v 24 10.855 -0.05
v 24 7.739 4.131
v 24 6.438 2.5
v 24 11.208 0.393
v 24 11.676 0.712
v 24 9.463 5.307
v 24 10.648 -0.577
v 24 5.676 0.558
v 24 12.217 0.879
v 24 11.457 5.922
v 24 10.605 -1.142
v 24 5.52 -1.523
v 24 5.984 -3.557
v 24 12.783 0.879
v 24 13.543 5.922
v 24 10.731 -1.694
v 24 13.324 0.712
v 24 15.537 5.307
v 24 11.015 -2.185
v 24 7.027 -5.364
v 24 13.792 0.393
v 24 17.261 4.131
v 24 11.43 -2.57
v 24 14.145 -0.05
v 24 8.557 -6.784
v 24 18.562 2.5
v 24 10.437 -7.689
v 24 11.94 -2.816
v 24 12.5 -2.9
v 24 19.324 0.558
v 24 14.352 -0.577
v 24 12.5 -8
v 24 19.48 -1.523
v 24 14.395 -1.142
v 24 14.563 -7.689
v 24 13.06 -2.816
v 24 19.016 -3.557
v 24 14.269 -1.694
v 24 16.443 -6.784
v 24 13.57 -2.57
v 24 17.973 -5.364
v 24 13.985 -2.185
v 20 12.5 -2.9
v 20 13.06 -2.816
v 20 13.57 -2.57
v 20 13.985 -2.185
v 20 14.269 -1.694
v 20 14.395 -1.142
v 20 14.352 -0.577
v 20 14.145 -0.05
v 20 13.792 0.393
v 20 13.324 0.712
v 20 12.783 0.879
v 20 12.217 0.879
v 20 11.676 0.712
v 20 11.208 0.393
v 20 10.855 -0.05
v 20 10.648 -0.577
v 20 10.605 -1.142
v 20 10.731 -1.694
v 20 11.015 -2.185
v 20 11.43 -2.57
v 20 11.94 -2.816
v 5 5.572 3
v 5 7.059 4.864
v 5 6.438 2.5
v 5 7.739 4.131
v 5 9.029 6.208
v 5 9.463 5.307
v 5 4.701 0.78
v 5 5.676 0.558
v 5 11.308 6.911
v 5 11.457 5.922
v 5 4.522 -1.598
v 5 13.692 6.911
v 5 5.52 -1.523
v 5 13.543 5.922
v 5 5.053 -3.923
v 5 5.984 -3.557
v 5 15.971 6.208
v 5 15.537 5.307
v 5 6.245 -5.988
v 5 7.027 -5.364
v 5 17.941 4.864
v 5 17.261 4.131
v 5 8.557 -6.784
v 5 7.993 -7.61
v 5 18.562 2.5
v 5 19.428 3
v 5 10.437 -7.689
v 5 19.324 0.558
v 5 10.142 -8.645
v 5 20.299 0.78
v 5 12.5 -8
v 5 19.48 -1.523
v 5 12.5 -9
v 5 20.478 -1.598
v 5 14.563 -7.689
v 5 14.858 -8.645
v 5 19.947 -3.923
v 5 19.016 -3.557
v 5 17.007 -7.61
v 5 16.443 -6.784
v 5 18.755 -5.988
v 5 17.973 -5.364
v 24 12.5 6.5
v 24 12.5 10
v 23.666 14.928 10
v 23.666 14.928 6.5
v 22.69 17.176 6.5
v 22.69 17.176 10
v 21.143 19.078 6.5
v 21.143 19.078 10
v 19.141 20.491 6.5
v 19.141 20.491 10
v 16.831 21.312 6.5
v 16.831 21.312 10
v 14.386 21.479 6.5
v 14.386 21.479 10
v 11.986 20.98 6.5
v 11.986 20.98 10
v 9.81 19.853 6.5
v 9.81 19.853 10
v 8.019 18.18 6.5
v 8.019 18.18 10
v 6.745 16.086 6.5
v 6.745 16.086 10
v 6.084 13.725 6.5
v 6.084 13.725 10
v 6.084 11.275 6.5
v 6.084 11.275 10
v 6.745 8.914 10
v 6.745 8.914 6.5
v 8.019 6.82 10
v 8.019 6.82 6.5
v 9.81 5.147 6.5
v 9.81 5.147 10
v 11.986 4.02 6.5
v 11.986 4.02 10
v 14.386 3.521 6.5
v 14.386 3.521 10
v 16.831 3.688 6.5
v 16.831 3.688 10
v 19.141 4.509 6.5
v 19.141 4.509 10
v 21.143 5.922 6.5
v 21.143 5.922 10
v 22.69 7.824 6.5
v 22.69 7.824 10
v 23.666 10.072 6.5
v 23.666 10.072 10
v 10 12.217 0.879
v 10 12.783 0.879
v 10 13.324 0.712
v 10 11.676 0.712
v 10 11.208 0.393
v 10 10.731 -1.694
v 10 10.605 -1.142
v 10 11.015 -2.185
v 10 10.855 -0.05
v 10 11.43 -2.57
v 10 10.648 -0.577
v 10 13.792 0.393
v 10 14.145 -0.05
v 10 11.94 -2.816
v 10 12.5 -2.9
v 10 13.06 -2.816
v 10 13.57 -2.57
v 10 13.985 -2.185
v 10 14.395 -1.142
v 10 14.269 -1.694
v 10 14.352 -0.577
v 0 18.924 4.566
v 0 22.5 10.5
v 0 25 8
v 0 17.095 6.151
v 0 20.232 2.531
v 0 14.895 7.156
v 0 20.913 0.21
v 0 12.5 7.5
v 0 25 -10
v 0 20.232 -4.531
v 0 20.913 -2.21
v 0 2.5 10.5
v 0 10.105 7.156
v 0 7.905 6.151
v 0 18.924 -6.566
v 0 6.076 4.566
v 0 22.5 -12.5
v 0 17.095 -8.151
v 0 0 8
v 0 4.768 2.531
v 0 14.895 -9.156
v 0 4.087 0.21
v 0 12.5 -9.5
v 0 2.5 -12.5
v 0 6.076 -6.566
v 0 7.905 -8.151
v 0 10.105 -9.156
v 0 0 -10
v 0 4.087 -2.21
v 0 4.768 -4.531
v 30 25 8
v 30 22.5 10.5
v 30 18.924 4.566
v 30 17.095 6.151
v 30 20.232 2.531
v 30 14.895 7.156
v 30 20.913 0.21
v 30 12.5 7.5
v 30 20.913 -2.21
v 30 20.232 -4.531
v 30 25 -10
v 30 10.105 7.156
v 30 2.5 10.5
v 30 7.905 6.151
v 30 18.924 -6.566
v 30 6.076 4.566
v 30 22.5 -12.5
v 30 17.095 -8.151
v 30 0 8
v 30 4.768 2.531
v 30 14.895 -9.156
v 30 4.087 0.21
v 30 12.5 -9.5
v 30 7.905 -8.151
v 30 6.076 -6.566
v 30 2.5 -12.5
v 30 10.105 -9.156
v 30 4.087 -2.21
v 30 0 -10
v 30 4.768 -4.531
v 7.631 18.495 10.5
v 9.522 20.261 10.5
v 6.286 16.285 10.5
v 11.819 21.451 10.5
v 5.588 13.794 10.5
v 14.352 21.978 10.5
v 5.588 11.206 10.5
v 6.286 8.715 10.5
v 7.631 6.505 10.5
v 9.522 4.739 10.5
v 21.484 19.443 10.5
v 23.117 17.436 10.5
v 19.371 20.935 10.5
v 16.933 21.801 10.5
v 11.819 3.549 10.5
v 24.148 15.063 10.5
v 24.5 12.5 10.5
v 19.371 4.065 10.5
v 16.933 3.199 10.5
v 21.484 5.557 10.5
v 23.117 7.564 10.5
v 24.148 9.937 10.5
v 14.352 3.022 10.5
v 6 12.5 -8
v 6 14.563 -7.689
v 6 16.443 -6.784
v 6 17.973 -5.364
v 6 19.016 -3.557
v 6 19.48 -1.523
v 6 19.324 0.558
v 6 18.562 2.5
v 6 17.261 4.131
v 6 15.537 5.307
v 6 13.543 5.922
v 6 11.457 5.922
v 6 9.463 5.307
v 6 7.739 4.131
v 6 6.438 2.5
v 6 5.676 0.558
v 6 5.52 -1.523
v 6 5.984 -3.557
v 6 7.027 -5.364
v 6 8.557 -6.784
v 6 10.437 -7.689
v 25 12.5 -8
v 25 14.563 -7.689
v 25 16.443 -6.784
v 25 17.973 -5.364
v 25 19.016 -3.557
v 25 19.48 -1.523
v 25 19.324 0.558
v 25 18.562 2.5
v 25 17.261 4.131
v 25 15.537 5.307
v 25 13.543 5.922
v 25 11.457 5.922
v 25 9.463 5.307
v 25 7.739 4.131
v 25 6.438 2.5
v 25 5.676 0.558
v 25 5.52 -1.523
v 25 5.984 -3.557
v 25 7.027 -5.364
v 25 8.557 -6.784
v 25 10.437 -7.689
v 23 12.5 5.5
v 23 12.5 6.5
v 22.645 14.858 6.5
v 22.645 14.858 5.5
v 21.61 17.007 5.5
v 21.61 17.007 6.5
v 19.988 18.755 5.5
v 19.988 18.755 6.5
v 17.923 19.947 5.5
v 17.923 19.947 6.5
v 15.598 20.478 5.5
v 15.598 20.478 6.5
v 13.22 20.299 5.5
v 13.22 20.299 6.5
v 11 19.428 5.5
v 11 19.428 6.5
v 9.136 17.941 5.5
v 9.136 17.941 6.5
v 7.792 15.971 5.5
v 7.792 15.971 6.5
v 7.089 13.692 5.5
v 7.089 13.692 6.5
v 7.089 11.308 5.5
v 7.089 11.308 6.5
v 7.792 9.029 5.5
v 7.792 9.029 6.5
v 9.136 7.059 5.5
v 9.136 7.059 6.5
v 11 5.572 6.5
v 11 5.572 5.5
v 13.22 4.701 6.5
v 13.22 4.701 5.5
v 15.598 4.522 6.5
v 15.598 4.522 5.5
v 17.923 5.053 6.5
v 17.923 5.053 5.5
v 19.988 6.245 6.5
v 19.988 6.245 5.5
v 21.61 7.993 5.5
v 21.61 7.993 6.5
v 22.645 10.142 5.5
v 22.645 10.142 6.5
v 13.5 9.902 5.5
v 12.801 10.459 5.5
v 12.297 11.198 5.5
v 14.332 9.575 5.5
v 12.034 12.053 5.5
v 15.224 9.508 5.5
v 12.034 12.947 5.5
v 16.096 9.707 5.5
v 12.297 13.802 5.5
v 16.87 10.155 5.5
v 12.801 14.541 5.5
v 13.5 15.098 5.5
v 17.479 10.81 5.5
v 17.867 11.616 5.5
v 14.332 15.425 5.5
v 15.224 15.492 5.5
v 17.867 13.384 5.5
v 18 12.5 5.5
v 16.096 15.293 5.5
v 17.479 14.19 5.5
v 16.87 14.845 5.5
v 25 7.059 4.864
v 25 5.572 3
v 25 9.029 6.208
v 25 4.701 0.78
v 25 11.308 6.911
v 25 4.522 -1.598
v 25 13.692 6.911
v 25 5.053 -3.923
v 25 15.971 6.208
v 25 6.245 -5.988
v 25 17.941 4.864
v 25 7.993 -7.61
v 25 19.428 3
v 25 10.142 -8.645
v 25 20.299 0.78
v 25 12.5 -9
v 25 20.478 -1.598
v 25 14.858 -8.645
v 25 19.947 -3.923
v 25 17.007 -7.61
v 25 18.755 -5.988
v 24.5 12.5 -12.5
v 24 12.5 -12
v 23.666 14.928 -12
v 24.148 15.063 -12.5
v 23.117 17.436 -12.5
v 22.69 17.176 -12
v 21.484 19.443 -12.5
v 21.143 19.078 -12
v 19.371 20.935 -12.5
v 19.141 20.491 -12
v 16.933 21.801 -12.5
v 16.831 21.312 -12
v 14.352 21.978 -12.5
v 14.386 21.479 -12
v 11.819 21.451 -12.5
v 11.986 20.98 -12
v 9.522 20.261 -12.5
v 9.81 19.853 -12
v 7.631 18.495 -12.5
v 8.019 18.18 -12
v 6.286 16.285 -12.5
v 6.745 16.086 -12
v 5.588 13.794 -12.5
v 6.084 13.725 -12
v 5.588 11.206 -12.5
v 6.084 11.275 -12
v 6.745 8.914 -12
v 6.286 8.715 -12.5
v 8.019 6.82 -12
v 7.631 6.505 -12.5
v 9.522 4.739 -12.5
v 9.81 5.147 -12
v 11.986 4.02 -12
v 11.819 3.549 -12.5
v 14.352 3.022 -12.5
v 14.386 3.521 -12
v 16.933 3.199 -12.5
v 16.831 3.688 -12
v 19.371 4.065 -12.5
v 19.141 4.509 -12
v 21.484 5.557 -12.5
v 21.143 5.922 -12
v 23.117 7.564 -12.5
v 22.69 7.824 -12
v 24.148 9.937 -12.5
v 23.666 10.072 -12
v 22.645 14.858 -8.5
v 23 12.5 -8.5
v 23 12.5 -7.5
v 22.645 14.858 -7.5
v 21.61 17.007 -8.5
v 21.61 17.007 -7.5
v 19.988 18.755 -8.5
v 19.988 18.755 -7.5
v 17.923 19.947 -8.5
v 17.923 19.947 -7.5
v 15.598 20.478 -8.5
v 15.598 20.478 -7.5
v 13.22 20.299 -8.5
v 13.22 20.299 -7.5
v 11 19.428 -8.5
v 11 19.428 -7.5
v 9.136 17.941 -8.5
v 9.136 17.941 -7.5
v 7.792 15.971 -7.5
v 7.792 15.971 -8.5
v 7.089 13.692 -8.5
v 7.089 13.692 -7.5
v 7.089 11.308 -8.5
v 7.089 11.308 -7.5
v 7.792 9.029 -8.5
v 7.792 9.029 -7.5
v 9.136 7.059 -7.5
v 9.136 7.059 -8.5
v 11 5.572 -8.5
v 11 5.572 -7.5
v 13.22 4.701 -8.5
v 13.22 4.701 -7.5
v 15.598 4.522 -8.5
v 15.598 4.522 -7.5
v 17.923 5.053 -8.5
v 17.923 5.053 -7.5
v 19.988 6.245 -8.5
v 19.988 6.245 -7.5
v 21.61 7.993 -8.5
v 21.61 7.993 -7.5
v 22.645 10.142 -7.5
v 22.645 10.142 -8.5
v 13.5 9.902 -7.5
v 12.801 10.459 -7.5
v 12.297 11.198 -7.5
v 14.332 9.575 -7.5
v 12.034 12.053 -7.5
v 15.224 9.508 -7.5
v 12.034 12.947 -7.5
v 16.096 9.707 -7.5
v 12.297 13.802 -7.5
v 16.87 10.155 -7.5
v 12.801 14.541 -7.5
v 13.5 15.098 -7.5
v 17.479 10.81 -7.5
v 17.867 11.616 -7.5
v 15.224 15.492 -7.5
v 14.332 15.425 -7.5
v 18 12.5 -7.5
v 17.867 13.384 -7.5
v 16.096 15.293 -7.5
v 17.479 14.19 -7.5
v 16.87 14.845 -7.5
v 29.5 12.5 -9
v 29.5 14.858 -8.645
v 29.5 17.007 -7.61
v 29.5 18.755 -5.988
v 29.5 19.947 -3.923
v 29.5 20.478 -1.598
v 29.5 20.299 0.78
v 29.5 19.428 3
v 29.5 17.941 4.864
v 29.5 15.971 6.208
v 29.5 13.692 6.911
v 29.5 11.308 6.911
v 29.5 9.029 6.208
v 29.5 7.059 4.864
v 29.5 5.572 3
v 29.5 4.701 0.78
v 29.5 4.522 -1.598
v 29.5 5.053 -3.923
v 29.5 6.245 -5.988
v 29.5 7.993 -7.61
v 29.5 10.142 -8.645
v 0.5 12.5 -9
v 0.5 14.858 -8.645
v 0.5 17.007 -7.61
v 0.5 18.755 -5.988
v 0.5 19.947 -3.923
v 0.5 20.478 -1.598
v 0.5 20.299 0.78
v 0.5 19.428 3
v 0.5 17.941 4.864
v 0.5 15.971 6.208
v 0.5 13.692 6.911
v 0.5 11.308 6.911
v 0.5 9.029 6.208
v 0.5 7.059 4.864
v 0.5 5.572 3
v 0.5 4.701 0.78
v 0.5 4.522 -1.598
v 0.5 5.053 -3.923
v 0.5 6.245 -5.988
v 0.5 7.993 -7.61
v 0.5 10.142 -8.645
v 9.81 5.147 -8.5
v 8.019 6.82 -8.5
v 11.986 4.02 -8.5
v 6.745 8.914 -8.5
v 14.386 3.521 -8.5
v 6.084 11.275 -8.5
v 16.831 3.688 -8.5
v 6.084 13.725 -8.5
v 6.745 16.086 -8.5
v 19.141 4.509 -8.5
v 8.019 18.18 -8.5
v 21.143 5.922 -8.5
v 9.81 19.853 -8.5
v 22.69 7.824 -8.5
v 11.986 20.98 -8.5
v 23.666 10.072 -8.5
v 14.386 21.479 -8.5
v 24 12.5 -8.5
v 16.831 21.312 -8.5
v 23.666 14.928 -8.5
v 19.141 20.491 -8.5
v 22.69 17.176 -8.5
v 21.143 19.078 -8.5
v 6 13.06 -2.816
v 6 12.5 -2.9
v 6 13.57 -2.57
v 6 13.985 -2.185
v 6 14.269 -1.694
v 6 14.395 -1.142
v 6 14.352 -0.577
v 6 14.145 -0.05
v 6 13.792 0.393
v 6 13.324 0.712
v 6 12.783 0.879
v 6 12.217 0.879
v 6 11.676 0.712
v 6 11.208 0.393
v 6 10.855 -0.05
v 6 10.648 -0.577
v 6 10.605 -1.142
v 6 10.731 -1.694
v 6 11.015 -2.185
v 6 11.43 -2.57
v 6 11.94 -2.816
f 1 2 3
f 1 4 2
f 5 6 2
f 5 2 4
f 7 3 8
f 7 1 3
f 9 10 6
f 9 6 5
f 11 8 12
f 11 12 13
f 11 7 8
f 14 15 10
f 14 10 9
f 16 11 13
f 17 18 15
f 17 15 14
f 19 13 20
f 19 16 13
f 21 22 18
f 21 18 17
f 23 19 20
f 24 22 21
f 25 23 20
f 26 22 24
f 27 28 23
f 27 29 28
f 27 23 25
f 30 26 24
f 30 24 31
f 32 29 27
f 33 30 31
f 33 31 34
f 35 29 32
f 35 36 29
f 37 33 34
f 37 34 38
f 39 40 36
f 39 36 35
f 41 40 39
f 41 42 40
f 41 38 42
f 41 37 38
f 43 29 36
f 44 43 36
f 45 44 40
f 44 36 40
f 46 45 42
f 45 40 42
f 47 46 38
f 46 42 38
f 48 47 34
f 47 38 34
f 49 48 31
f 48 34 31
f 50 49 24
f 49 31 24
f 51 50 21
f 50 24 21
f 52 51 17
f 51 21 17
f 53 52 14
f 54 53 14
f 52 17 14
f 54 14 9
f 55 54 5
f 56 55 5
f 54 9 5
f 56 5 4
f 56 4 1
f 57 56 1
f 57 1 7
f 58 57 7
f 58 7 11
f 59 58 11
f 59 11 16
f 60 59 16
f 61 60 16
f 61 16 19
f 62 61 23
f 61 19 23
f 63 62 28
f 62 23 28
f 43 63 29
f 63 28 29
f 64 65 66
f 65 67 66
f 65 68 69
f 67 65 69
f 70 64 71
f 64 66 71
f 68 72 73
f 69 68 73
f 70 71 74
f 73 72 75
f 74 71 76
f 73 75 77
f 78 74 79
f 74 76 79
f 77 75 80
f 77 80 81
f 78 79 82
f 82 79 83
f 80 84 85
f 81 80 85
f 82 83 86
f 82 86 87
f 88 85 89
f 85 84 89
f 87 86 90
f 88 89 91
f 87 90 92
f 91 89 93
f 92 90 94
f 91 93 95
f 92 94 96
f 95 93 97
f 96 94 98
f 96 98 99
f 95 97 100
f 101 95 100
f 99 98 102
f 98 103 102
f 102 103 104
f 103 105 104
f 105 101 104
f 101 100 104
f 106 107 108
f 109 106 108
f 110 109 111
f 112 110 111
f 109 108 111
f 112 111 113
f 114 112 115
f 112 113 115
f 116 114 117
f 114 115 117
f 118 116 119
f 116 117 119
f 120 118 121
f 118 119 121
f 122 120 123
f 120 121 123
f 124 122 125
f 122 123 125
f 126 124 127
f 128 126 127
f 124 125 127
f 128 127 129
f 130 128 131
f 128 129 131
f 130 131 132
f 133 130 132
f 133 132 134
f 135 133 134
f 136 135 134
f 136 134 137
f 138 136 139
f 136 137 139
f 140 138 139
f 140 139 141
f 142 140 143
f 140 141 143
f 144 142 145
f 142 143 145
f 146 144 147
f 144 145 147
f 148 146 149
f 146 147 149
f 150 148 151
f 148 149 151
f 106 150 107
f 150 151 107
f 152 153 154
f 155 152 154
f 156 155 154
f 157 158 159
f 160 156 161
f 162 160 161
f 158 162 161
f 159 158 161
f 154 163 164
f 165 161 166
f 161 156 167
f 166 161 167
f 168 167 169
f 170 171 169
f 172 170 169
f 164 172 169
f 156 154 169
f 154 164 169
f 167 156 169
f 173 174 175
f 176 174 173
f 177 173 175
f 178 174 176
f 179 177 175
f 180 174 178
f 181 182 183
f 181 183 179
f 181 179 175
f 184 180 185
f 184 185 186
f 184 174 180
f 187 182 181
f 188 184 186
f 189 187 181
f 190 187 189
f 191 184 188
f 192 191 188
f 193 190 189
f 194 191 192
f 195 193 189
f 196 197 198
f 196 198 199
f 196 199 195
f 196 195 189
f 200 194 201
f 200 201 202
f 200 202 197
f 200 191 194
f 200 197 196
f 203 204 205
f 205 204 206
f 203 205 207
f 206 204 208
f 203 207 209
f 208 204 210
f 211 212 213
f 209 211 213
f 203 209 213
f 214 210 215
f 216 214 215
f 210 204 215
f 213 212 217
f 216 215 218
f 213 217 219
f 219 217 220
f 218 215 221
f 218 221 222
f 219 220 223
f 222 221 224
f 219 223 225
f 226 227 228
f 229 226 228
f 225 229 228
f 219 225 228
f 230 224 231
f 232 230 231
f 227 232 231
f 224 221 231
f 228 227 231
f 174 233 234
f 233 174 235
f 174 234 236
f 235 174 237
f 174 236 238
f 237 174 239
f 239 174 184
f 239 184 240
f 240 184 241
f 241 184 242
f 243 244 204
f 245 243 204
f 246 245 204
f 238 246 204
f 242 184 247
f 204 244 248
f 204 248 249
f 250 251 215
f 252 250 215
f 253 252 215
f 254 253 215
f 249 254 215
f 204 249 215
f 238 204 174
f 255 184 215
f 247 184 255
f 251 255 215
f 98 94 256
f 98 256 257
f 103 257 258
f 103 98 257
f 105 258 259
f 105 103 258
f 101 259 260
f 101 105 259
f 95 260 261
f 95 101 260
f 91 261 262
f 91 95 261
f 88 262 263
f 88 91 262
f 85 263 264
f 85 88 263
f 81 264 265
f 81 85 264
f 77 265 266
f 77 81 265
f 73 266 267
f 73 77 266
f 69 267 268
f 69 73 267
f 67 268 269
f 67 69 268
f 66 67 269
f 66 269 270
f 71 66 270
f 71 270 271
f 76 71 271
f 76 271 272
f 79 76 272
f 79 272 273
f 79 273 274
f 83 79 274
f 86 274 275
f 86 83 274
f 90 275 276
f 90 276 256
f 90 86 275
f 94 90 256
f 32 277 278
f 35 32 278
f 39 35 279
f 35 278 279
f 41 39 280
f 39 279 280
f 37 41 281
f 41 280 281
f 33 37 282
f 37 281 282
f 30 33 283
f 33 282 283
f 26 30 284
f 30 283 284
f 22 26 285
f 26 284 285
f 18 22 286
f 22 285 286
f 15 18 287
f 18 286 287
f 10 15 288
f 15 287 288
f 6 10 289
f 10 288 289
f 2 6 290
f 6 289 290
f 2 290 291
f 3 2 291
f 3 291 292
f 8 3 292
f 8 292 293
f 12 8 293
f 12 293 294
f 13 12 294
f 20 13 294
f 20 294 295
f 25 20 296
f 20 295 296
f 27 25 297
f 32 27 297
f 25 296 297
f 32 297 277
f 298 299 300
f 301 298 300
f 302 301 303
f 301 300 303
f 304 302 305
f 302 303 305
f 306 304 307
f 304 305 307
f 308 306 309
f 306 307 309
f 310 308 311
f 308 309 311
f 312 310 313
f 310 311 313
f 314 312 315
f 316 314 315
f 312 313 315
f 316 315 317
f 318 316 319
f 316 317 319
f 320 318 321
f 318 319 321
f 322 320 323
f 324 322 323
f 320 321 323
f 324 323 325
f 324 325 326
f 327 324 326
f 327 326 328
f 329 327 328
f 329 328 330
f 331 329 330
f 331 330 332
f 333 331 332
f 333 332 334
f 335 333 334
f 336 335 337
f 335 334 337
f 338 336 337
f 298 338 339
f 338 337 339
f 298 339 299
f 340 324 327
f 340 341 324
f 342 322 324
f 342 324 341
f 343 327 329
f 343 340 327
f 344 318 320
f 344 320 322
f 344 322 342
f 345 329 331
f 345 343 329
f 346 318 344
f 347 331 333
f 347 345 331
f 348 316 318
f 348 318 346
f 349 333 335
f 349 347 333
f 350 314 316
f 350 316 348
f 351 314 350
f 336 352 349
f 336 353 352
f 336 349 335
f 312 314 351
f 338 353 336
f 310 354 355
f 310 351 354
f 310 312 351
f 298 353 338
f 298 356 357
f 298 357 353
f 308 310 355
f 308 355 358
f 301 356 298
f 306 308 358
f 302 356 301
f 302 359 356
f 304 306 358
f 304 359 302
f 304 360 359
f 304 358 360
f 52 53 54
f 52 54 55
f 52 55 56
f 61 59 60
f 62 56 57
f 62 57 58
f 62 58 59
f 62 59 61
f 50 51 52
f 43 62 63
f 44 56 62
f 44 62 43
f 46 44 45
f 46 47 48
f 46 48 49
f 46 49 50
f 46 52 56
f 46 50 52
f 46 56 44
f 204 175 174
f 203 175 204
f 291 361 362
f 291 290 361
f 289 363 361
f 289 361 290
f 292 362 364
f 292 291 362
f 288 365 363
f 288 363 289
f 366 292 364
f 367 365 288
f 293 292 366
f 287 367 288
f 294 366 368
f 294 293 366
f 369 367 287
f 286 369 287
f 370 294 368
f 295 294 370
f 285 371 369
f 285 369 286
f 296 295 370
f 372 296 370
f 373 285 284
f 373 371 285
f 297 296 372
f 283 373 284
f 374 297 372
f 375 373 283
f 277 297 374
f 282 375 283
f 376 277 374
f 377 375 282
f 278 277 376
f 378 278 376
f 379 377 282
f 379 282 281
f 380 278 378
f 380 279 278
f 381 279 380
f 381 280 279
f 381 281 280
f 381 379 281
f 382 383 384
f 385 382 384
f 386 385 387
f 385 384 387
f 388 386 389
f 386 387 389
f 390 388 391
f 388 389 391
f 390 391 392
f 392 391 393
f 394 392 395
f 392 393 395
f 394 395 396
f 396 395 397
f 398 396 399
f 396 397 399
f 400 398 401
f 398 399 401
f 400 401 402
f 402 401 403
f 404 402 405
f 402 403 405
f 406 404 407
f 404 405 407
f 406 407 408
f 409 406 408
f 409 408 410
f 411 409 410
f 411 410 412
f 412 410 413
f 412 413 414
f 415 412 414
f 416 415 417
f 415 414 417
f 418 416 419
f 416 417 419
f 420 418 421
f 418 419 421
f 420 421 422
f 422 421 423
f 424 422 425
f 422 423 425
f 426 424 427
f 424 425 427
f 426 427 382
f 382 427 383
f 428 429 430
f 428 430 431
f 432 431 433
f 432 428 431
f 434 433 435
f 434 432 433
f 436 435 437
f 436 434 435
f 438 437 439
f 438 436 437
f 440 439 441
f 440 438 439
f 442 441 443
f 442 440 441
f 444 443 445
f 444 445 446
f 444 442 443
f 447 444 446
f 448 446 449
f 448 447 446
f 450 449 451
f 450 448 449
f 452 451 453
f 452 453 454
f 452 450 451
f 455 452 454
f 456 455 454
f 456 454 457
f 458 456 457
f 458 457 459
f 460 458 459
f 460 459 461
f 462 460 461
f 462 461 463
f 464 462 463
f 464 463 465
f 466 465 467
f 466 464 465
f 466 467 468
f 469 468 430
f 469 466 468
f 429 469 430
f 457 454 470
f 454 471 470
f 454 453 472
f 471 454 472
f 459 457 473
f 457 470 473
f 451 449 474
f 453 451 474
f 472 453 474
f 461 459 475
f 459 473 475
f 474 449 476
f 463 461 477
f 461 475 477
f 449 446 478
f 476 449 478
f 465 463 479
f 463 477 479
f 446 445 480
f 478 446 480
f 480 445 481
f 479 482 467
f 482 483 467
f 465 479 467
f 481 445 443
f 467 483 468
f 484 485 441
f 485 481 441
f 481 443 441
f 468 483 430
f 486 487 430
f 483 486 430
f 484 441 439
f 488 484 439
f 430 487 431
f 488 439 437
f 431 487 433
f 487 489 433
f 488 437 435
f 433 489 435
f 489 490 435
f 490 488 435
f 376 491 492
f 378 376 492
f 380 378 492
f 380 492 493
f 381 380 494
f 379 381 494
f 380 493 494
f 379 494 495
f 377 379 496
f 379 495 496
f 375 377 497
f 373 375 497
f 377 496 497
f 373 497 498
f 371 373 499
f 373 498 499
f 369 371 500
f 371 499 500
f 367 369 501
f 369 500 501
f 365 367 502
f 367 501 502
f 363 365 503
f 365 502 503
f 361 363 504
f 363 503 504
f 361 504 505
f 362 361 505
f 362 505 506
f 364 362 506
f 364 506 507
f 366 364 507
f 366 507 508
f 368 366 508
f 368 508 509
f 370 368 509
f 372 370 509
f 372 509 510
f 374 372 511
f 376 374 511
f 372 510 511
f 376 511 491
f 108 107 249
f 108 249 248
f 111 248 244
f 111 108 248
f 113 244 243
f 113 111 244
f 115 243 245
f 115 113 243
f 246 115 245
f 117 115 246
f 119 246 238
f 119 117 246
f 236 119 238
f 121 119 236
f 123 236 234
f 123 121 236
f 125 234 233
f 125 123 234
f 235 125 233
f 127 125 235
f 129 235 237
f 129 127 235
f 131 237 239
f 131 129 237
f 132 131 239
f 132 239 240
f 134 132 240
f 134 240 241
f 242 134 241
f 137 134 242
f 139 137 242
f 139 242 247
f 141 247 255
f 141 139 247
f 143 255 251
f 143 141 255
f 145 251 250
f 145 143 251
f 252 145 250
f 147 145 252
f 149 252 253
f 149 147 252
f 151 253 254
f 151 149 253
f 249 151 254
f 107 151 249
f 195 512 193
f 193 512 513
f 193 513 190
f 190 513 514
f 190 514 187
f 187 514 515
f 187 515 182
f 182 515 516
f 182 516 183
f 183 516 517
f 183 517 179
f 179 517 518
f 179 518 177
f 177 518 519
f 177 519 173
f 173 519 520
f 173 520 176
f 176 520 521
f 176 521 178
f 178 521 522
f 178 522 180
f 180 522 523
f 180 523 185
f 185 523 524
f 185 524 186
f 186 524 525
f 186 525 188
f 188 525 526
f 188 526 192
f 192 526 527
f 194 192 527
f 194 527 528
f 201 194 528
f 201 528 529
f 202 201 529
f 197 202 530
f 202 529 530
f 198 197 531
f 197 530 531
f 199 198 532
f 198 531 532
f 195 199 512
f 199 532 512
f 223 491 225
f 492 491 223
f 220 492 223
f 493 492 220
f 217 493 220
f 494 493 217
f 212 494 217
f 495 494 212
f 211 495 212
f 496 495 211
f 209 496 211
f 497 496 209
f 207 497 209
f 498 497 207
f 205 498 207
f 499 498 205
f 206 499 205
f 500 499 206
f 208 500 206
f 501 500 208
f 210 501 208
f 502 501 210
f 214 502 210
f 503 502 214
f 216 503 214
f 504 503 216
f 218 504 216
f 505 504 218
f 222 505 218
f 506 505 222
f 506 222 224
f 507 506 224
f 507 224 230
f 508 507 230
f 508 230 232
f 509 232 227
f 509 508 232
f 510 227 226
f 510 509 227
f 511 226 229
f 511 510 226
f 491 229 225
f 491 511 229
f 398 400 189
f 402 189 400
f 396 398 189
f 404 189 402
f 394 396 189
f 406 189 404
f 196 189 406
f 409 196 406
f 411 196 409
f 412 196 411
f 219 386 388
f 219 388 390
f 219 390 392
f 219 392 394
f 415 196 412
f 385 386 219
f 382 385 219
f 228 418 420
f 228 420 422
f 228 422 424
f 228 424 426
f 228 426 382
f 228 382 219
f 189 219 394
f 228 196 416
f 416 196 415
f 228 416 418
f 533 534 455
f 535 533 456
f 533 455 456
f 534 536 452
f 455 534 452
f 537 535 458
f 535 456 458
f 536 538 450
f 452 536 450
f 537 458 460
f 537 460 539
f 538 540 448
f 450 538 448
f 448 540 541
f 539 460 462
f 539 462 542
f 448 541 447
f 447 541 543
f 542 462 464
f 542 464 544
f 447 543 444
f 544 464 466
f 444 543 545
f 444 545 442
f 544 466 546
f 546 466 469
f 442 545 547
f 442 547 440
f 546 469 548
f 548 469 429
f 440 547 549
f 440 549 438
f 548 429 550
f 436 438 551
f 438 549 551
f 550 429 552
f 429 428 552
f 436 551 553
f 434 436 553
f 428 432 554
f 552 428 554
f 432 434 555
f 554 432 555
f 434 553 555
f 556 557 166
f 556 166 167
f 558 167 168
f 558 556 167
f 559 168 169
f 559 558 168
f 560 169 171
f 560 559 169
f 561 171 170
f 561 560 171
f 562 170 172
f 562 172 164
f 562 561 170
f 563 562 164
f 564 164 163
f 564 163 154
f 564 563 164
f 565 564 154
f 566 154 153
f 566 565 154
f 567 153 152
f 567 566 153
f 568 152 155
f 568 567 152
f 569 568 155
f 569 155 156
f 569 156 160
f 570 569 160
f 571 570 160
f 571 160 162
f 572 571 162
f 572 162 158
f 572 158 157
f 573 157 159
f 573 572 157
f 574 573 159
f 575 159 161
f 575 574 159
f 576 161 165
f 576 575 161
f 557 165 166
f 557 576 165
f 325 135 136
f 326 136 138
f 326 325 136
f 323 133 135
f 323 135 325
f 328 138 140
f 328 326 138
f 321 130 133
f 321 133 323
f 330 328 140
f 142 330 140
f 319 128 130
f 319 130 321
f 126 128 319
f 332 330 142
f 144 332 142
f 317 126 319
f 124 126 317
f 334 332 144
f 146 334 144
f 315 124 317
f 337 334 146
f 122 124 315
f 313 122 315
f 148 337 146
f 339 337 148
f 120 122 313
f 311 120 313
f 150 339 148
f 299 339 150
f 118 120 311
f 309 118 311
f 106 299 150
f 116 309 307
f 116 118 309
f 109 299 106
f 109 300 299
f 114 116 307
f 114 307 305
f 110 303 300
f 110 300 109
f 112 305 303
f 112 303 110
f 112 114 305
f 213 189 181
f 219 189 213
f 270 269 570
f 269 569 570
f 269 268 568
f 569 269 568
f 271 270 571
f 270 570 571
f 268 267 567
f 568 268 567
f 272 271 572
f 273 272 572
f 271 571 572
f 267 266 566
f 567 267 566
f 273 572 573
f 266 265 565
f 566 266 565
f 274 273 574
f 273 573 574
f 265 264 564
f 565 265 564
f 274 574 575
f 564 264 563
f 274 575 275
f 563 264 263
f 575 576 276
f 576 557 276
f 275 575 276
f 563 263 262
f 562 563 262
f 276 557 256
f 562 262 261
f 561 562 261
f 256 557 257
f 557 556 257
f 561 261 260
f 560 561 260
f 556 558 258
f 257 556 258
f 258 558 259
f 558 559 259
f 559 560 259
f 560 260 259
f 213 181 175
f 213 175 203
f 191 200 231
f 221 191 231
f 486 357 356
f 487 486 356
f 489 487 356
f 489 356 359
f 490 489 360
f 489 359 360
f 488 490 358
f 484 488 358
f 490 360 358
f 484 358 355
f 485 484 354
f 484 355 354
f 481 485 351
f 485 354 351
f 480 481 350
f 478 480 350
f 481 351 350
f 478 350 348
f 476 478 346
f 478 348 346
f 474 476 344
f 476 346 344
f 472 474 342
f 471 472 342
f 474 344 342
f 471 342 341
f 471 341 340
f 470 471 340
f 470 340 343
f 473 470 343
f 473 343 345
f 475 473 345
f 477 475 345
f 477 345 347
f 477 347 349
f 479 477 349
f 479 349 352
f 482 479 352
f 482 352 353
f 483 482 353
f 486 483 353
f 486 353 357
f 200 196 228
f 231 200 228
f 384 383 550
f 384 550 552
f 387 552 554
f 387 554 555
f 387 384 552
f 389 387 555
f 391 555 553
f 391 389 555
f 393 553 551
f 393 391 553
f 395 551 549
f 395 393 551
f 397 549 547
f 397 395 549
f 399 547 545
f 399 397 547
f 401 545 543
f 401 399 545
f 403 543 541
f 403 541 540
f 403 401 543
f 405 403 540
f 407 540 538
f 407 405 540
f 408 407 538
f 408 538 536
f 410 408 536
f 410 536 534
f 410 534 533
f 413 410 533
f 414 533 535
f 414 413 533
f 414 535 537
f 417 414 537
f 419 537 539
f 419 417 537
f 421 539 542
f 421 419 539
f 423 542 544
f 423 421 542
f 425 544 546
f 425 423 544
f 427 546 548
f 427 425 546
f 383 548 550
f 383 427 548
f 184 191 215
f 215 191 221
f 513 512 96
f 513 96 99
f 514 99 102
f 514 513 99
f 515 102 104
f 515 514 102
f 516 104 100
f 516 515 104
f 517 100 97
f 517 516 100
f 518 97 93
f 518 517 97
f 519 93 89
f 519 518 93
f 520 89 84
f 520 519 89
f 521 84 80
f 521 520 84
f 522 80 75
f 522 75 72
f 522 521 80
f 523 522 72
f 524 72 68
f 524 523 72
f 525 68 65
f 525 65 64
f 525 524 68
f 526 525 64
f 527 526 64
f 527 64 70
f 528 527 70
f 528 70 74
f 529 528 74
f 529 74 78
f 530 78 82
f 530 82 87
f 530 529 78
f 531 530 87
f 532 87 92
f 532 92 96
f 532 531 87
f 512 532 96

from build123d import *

# Parameters (mm, degrees)
SKETCH1_W           = 30
SKETCH1_H           = 23
BOSS_EXTRUDE1_DEPTH = 25
SKETCH2_R           = 8
CUT_EXTRUDE1_DEPTH  = 5
SKETCH3_R           = 7
CUT_EXTRUDE2_DEPTH  = 1
SKETCH4_R           = 1.9
CUT_EXTRUDE3_DEPTH  = 4
SKETCH6_R           = 9
CUT_EXTRUDE4_DEPTH  = 4
SKETCH7_R           = 3
CUT_EXTRUDE8_DEPTH  = 19
SKETCH12_R          = 8
CUT_EXTRUDE9_DEPTH  = 1
CHAMFER1_SIZE       = 2.5
CHAMFER2_SIZE       = 0.5


with BuildPart() as part:
    # Sketch1 → Boss-Extrude1 (new body)
    with BuildSketch(Plane(origin=(0, 0, 0), x_dir=(1, 0, 0), z_dir=(0, 1, 0))):
        with Locations((15, 1)):
            Rectangle(SKETCH1_W, SKETCH1_H)
    extrude(amount=BOSS_EXTRUDE1_DEPTH)

    # Sketch2 → Cut-Extrude1 (cut)
    with BuildSketch(Plane(origin=(30, 0, 0), x_dir=(0, 0, -1), z_dir=(1, 0, 0))):
        with Locations((1, 12.5)):
            Circle(SKETCH2_R)
    cut_extrude1 = extrude(amount=-CUT_EXTRUDE1_DEPTH, mode=Mode.SUBTRACT)

    # Sketch3 → Cut-Extrude2 (cut)
    with BuildSketch(Plane(origin=(25, 0, 0), x_dir=(0, 0, -1), z_dir=(1, 0, 0))):
        with Locations((1, 12.5)):
            Circle(SKETCH3_R)
    cut_extrude2 = extrude(amount=-CUT_EXTRUDE2_DEPTH, mode=Mode.SUBTRACT)

    # Sketch4 → Cut-Extrude3 (cut)
    with BuildSketch(Plane(origin=(24, 0, 0), x_dir=(0, 0, -1), z_dir=(1, 0, 0))):
        with Locations((1, 12.5)):
            Circle(SKETCH4_R)
    cut_extrude3 = extrude(amount=-CUT_EXTRUDE3_DEPTH, mode=Mode.SUBTRACT)

    # Mirror1: Cut-Extrude1, Cut-Extrude2, Cut-Extrude3 across plane
    add(cut_extrude1.mirror(Plane(origin=(15, 25, 0), x_dir=(0, 0, 1), z_dir=(1, 0, 0))), mode=Mode.SUBTRACT)
    add(cut_extrude2.mirror(Plane(origin=(15, 25, 0), x_dir=(0, 0, 1), z_dir=(1, 0, 0))), mode=Mode.SUBTRACT)
    add(cut_extrude3.mirror(Plane(origin=(15, 25, 0), x_dir=(0, 0, 1), z_dir=(1, 0, 0))), mode=Mode.SUBTRACT)

    # Sketch6 → Cut-Extrude4 (cut)
    with BuildSketch(Plane.XY.offset(10.5)):
        with Locations((15, 12.5)):
            Circle(SKETCH6_R)
    cut_extrude4 = extrude(amount=-CUT_EXTRUDE4_DEPTH, mode=Mode.SUBTRACT)

    # Sketch7 → Cut-Extrude8 (cut)
    with BuildSketch(Plane.XY.offset(6.5)):
        with Locations((15, 12.5)):
            Circle(SKETCH7_R)
    extrude(amount=-CUT_EXTRUDE8_DEPTH, mode=Mode.SUBTRACT)

    # Sketch12 → Cut-Extrude9 (cut)
    with BuildSketch(Plane.XY.offset(6.5)):
        with Locations((15, 12.5)):
            Circle(SKETCH12_R)
    cut_extrude9 = extrude(amount=-CUT_EXTRUDE9_DEPTH, mode=Mode.SUBTRACT)

    # Mirror4: Cut-Extrude4, Cut-Extrude9 across plane
    add(cut_extrude4.mirror(Plane(origin=(15, 0, -1), x_dir=(1, 0, 0), z_dir=(0, 0, 1))), mode=Mode.SUBTRACT)
    add(cut_extrude9.mirror(Plane(origin=(15, 0, -1), x_dir=(1, 0, 0), z_dir=(0, 0, 1))), mode=Mode.SUBTRACT)

    # Chamfer1
    chamfer1_edges = [part.edges().sort_by_distance(p)[0] for p in [
        (15, 25, -12.5),
        (15, 0, -12.5),
        (15, 0, 10.5),
        (15, 25, 10.5),
    ]]
    chamfer(chamfer1_edges, length=CHAMFER1_SIZE)

    # Chamfer2
    chamfer2_edges = [part.edges().sort_by_distance(p)[0] for p in [
        (30, 12.5, 7),
        (0, 12.5, 7),
        (6, 12.5, 10.5),
        (6, 12.5, -12.5),
    ]]
    chamfer(chamfer2_edges, length=CHAMFER2_SIZE)


solid = part.part
